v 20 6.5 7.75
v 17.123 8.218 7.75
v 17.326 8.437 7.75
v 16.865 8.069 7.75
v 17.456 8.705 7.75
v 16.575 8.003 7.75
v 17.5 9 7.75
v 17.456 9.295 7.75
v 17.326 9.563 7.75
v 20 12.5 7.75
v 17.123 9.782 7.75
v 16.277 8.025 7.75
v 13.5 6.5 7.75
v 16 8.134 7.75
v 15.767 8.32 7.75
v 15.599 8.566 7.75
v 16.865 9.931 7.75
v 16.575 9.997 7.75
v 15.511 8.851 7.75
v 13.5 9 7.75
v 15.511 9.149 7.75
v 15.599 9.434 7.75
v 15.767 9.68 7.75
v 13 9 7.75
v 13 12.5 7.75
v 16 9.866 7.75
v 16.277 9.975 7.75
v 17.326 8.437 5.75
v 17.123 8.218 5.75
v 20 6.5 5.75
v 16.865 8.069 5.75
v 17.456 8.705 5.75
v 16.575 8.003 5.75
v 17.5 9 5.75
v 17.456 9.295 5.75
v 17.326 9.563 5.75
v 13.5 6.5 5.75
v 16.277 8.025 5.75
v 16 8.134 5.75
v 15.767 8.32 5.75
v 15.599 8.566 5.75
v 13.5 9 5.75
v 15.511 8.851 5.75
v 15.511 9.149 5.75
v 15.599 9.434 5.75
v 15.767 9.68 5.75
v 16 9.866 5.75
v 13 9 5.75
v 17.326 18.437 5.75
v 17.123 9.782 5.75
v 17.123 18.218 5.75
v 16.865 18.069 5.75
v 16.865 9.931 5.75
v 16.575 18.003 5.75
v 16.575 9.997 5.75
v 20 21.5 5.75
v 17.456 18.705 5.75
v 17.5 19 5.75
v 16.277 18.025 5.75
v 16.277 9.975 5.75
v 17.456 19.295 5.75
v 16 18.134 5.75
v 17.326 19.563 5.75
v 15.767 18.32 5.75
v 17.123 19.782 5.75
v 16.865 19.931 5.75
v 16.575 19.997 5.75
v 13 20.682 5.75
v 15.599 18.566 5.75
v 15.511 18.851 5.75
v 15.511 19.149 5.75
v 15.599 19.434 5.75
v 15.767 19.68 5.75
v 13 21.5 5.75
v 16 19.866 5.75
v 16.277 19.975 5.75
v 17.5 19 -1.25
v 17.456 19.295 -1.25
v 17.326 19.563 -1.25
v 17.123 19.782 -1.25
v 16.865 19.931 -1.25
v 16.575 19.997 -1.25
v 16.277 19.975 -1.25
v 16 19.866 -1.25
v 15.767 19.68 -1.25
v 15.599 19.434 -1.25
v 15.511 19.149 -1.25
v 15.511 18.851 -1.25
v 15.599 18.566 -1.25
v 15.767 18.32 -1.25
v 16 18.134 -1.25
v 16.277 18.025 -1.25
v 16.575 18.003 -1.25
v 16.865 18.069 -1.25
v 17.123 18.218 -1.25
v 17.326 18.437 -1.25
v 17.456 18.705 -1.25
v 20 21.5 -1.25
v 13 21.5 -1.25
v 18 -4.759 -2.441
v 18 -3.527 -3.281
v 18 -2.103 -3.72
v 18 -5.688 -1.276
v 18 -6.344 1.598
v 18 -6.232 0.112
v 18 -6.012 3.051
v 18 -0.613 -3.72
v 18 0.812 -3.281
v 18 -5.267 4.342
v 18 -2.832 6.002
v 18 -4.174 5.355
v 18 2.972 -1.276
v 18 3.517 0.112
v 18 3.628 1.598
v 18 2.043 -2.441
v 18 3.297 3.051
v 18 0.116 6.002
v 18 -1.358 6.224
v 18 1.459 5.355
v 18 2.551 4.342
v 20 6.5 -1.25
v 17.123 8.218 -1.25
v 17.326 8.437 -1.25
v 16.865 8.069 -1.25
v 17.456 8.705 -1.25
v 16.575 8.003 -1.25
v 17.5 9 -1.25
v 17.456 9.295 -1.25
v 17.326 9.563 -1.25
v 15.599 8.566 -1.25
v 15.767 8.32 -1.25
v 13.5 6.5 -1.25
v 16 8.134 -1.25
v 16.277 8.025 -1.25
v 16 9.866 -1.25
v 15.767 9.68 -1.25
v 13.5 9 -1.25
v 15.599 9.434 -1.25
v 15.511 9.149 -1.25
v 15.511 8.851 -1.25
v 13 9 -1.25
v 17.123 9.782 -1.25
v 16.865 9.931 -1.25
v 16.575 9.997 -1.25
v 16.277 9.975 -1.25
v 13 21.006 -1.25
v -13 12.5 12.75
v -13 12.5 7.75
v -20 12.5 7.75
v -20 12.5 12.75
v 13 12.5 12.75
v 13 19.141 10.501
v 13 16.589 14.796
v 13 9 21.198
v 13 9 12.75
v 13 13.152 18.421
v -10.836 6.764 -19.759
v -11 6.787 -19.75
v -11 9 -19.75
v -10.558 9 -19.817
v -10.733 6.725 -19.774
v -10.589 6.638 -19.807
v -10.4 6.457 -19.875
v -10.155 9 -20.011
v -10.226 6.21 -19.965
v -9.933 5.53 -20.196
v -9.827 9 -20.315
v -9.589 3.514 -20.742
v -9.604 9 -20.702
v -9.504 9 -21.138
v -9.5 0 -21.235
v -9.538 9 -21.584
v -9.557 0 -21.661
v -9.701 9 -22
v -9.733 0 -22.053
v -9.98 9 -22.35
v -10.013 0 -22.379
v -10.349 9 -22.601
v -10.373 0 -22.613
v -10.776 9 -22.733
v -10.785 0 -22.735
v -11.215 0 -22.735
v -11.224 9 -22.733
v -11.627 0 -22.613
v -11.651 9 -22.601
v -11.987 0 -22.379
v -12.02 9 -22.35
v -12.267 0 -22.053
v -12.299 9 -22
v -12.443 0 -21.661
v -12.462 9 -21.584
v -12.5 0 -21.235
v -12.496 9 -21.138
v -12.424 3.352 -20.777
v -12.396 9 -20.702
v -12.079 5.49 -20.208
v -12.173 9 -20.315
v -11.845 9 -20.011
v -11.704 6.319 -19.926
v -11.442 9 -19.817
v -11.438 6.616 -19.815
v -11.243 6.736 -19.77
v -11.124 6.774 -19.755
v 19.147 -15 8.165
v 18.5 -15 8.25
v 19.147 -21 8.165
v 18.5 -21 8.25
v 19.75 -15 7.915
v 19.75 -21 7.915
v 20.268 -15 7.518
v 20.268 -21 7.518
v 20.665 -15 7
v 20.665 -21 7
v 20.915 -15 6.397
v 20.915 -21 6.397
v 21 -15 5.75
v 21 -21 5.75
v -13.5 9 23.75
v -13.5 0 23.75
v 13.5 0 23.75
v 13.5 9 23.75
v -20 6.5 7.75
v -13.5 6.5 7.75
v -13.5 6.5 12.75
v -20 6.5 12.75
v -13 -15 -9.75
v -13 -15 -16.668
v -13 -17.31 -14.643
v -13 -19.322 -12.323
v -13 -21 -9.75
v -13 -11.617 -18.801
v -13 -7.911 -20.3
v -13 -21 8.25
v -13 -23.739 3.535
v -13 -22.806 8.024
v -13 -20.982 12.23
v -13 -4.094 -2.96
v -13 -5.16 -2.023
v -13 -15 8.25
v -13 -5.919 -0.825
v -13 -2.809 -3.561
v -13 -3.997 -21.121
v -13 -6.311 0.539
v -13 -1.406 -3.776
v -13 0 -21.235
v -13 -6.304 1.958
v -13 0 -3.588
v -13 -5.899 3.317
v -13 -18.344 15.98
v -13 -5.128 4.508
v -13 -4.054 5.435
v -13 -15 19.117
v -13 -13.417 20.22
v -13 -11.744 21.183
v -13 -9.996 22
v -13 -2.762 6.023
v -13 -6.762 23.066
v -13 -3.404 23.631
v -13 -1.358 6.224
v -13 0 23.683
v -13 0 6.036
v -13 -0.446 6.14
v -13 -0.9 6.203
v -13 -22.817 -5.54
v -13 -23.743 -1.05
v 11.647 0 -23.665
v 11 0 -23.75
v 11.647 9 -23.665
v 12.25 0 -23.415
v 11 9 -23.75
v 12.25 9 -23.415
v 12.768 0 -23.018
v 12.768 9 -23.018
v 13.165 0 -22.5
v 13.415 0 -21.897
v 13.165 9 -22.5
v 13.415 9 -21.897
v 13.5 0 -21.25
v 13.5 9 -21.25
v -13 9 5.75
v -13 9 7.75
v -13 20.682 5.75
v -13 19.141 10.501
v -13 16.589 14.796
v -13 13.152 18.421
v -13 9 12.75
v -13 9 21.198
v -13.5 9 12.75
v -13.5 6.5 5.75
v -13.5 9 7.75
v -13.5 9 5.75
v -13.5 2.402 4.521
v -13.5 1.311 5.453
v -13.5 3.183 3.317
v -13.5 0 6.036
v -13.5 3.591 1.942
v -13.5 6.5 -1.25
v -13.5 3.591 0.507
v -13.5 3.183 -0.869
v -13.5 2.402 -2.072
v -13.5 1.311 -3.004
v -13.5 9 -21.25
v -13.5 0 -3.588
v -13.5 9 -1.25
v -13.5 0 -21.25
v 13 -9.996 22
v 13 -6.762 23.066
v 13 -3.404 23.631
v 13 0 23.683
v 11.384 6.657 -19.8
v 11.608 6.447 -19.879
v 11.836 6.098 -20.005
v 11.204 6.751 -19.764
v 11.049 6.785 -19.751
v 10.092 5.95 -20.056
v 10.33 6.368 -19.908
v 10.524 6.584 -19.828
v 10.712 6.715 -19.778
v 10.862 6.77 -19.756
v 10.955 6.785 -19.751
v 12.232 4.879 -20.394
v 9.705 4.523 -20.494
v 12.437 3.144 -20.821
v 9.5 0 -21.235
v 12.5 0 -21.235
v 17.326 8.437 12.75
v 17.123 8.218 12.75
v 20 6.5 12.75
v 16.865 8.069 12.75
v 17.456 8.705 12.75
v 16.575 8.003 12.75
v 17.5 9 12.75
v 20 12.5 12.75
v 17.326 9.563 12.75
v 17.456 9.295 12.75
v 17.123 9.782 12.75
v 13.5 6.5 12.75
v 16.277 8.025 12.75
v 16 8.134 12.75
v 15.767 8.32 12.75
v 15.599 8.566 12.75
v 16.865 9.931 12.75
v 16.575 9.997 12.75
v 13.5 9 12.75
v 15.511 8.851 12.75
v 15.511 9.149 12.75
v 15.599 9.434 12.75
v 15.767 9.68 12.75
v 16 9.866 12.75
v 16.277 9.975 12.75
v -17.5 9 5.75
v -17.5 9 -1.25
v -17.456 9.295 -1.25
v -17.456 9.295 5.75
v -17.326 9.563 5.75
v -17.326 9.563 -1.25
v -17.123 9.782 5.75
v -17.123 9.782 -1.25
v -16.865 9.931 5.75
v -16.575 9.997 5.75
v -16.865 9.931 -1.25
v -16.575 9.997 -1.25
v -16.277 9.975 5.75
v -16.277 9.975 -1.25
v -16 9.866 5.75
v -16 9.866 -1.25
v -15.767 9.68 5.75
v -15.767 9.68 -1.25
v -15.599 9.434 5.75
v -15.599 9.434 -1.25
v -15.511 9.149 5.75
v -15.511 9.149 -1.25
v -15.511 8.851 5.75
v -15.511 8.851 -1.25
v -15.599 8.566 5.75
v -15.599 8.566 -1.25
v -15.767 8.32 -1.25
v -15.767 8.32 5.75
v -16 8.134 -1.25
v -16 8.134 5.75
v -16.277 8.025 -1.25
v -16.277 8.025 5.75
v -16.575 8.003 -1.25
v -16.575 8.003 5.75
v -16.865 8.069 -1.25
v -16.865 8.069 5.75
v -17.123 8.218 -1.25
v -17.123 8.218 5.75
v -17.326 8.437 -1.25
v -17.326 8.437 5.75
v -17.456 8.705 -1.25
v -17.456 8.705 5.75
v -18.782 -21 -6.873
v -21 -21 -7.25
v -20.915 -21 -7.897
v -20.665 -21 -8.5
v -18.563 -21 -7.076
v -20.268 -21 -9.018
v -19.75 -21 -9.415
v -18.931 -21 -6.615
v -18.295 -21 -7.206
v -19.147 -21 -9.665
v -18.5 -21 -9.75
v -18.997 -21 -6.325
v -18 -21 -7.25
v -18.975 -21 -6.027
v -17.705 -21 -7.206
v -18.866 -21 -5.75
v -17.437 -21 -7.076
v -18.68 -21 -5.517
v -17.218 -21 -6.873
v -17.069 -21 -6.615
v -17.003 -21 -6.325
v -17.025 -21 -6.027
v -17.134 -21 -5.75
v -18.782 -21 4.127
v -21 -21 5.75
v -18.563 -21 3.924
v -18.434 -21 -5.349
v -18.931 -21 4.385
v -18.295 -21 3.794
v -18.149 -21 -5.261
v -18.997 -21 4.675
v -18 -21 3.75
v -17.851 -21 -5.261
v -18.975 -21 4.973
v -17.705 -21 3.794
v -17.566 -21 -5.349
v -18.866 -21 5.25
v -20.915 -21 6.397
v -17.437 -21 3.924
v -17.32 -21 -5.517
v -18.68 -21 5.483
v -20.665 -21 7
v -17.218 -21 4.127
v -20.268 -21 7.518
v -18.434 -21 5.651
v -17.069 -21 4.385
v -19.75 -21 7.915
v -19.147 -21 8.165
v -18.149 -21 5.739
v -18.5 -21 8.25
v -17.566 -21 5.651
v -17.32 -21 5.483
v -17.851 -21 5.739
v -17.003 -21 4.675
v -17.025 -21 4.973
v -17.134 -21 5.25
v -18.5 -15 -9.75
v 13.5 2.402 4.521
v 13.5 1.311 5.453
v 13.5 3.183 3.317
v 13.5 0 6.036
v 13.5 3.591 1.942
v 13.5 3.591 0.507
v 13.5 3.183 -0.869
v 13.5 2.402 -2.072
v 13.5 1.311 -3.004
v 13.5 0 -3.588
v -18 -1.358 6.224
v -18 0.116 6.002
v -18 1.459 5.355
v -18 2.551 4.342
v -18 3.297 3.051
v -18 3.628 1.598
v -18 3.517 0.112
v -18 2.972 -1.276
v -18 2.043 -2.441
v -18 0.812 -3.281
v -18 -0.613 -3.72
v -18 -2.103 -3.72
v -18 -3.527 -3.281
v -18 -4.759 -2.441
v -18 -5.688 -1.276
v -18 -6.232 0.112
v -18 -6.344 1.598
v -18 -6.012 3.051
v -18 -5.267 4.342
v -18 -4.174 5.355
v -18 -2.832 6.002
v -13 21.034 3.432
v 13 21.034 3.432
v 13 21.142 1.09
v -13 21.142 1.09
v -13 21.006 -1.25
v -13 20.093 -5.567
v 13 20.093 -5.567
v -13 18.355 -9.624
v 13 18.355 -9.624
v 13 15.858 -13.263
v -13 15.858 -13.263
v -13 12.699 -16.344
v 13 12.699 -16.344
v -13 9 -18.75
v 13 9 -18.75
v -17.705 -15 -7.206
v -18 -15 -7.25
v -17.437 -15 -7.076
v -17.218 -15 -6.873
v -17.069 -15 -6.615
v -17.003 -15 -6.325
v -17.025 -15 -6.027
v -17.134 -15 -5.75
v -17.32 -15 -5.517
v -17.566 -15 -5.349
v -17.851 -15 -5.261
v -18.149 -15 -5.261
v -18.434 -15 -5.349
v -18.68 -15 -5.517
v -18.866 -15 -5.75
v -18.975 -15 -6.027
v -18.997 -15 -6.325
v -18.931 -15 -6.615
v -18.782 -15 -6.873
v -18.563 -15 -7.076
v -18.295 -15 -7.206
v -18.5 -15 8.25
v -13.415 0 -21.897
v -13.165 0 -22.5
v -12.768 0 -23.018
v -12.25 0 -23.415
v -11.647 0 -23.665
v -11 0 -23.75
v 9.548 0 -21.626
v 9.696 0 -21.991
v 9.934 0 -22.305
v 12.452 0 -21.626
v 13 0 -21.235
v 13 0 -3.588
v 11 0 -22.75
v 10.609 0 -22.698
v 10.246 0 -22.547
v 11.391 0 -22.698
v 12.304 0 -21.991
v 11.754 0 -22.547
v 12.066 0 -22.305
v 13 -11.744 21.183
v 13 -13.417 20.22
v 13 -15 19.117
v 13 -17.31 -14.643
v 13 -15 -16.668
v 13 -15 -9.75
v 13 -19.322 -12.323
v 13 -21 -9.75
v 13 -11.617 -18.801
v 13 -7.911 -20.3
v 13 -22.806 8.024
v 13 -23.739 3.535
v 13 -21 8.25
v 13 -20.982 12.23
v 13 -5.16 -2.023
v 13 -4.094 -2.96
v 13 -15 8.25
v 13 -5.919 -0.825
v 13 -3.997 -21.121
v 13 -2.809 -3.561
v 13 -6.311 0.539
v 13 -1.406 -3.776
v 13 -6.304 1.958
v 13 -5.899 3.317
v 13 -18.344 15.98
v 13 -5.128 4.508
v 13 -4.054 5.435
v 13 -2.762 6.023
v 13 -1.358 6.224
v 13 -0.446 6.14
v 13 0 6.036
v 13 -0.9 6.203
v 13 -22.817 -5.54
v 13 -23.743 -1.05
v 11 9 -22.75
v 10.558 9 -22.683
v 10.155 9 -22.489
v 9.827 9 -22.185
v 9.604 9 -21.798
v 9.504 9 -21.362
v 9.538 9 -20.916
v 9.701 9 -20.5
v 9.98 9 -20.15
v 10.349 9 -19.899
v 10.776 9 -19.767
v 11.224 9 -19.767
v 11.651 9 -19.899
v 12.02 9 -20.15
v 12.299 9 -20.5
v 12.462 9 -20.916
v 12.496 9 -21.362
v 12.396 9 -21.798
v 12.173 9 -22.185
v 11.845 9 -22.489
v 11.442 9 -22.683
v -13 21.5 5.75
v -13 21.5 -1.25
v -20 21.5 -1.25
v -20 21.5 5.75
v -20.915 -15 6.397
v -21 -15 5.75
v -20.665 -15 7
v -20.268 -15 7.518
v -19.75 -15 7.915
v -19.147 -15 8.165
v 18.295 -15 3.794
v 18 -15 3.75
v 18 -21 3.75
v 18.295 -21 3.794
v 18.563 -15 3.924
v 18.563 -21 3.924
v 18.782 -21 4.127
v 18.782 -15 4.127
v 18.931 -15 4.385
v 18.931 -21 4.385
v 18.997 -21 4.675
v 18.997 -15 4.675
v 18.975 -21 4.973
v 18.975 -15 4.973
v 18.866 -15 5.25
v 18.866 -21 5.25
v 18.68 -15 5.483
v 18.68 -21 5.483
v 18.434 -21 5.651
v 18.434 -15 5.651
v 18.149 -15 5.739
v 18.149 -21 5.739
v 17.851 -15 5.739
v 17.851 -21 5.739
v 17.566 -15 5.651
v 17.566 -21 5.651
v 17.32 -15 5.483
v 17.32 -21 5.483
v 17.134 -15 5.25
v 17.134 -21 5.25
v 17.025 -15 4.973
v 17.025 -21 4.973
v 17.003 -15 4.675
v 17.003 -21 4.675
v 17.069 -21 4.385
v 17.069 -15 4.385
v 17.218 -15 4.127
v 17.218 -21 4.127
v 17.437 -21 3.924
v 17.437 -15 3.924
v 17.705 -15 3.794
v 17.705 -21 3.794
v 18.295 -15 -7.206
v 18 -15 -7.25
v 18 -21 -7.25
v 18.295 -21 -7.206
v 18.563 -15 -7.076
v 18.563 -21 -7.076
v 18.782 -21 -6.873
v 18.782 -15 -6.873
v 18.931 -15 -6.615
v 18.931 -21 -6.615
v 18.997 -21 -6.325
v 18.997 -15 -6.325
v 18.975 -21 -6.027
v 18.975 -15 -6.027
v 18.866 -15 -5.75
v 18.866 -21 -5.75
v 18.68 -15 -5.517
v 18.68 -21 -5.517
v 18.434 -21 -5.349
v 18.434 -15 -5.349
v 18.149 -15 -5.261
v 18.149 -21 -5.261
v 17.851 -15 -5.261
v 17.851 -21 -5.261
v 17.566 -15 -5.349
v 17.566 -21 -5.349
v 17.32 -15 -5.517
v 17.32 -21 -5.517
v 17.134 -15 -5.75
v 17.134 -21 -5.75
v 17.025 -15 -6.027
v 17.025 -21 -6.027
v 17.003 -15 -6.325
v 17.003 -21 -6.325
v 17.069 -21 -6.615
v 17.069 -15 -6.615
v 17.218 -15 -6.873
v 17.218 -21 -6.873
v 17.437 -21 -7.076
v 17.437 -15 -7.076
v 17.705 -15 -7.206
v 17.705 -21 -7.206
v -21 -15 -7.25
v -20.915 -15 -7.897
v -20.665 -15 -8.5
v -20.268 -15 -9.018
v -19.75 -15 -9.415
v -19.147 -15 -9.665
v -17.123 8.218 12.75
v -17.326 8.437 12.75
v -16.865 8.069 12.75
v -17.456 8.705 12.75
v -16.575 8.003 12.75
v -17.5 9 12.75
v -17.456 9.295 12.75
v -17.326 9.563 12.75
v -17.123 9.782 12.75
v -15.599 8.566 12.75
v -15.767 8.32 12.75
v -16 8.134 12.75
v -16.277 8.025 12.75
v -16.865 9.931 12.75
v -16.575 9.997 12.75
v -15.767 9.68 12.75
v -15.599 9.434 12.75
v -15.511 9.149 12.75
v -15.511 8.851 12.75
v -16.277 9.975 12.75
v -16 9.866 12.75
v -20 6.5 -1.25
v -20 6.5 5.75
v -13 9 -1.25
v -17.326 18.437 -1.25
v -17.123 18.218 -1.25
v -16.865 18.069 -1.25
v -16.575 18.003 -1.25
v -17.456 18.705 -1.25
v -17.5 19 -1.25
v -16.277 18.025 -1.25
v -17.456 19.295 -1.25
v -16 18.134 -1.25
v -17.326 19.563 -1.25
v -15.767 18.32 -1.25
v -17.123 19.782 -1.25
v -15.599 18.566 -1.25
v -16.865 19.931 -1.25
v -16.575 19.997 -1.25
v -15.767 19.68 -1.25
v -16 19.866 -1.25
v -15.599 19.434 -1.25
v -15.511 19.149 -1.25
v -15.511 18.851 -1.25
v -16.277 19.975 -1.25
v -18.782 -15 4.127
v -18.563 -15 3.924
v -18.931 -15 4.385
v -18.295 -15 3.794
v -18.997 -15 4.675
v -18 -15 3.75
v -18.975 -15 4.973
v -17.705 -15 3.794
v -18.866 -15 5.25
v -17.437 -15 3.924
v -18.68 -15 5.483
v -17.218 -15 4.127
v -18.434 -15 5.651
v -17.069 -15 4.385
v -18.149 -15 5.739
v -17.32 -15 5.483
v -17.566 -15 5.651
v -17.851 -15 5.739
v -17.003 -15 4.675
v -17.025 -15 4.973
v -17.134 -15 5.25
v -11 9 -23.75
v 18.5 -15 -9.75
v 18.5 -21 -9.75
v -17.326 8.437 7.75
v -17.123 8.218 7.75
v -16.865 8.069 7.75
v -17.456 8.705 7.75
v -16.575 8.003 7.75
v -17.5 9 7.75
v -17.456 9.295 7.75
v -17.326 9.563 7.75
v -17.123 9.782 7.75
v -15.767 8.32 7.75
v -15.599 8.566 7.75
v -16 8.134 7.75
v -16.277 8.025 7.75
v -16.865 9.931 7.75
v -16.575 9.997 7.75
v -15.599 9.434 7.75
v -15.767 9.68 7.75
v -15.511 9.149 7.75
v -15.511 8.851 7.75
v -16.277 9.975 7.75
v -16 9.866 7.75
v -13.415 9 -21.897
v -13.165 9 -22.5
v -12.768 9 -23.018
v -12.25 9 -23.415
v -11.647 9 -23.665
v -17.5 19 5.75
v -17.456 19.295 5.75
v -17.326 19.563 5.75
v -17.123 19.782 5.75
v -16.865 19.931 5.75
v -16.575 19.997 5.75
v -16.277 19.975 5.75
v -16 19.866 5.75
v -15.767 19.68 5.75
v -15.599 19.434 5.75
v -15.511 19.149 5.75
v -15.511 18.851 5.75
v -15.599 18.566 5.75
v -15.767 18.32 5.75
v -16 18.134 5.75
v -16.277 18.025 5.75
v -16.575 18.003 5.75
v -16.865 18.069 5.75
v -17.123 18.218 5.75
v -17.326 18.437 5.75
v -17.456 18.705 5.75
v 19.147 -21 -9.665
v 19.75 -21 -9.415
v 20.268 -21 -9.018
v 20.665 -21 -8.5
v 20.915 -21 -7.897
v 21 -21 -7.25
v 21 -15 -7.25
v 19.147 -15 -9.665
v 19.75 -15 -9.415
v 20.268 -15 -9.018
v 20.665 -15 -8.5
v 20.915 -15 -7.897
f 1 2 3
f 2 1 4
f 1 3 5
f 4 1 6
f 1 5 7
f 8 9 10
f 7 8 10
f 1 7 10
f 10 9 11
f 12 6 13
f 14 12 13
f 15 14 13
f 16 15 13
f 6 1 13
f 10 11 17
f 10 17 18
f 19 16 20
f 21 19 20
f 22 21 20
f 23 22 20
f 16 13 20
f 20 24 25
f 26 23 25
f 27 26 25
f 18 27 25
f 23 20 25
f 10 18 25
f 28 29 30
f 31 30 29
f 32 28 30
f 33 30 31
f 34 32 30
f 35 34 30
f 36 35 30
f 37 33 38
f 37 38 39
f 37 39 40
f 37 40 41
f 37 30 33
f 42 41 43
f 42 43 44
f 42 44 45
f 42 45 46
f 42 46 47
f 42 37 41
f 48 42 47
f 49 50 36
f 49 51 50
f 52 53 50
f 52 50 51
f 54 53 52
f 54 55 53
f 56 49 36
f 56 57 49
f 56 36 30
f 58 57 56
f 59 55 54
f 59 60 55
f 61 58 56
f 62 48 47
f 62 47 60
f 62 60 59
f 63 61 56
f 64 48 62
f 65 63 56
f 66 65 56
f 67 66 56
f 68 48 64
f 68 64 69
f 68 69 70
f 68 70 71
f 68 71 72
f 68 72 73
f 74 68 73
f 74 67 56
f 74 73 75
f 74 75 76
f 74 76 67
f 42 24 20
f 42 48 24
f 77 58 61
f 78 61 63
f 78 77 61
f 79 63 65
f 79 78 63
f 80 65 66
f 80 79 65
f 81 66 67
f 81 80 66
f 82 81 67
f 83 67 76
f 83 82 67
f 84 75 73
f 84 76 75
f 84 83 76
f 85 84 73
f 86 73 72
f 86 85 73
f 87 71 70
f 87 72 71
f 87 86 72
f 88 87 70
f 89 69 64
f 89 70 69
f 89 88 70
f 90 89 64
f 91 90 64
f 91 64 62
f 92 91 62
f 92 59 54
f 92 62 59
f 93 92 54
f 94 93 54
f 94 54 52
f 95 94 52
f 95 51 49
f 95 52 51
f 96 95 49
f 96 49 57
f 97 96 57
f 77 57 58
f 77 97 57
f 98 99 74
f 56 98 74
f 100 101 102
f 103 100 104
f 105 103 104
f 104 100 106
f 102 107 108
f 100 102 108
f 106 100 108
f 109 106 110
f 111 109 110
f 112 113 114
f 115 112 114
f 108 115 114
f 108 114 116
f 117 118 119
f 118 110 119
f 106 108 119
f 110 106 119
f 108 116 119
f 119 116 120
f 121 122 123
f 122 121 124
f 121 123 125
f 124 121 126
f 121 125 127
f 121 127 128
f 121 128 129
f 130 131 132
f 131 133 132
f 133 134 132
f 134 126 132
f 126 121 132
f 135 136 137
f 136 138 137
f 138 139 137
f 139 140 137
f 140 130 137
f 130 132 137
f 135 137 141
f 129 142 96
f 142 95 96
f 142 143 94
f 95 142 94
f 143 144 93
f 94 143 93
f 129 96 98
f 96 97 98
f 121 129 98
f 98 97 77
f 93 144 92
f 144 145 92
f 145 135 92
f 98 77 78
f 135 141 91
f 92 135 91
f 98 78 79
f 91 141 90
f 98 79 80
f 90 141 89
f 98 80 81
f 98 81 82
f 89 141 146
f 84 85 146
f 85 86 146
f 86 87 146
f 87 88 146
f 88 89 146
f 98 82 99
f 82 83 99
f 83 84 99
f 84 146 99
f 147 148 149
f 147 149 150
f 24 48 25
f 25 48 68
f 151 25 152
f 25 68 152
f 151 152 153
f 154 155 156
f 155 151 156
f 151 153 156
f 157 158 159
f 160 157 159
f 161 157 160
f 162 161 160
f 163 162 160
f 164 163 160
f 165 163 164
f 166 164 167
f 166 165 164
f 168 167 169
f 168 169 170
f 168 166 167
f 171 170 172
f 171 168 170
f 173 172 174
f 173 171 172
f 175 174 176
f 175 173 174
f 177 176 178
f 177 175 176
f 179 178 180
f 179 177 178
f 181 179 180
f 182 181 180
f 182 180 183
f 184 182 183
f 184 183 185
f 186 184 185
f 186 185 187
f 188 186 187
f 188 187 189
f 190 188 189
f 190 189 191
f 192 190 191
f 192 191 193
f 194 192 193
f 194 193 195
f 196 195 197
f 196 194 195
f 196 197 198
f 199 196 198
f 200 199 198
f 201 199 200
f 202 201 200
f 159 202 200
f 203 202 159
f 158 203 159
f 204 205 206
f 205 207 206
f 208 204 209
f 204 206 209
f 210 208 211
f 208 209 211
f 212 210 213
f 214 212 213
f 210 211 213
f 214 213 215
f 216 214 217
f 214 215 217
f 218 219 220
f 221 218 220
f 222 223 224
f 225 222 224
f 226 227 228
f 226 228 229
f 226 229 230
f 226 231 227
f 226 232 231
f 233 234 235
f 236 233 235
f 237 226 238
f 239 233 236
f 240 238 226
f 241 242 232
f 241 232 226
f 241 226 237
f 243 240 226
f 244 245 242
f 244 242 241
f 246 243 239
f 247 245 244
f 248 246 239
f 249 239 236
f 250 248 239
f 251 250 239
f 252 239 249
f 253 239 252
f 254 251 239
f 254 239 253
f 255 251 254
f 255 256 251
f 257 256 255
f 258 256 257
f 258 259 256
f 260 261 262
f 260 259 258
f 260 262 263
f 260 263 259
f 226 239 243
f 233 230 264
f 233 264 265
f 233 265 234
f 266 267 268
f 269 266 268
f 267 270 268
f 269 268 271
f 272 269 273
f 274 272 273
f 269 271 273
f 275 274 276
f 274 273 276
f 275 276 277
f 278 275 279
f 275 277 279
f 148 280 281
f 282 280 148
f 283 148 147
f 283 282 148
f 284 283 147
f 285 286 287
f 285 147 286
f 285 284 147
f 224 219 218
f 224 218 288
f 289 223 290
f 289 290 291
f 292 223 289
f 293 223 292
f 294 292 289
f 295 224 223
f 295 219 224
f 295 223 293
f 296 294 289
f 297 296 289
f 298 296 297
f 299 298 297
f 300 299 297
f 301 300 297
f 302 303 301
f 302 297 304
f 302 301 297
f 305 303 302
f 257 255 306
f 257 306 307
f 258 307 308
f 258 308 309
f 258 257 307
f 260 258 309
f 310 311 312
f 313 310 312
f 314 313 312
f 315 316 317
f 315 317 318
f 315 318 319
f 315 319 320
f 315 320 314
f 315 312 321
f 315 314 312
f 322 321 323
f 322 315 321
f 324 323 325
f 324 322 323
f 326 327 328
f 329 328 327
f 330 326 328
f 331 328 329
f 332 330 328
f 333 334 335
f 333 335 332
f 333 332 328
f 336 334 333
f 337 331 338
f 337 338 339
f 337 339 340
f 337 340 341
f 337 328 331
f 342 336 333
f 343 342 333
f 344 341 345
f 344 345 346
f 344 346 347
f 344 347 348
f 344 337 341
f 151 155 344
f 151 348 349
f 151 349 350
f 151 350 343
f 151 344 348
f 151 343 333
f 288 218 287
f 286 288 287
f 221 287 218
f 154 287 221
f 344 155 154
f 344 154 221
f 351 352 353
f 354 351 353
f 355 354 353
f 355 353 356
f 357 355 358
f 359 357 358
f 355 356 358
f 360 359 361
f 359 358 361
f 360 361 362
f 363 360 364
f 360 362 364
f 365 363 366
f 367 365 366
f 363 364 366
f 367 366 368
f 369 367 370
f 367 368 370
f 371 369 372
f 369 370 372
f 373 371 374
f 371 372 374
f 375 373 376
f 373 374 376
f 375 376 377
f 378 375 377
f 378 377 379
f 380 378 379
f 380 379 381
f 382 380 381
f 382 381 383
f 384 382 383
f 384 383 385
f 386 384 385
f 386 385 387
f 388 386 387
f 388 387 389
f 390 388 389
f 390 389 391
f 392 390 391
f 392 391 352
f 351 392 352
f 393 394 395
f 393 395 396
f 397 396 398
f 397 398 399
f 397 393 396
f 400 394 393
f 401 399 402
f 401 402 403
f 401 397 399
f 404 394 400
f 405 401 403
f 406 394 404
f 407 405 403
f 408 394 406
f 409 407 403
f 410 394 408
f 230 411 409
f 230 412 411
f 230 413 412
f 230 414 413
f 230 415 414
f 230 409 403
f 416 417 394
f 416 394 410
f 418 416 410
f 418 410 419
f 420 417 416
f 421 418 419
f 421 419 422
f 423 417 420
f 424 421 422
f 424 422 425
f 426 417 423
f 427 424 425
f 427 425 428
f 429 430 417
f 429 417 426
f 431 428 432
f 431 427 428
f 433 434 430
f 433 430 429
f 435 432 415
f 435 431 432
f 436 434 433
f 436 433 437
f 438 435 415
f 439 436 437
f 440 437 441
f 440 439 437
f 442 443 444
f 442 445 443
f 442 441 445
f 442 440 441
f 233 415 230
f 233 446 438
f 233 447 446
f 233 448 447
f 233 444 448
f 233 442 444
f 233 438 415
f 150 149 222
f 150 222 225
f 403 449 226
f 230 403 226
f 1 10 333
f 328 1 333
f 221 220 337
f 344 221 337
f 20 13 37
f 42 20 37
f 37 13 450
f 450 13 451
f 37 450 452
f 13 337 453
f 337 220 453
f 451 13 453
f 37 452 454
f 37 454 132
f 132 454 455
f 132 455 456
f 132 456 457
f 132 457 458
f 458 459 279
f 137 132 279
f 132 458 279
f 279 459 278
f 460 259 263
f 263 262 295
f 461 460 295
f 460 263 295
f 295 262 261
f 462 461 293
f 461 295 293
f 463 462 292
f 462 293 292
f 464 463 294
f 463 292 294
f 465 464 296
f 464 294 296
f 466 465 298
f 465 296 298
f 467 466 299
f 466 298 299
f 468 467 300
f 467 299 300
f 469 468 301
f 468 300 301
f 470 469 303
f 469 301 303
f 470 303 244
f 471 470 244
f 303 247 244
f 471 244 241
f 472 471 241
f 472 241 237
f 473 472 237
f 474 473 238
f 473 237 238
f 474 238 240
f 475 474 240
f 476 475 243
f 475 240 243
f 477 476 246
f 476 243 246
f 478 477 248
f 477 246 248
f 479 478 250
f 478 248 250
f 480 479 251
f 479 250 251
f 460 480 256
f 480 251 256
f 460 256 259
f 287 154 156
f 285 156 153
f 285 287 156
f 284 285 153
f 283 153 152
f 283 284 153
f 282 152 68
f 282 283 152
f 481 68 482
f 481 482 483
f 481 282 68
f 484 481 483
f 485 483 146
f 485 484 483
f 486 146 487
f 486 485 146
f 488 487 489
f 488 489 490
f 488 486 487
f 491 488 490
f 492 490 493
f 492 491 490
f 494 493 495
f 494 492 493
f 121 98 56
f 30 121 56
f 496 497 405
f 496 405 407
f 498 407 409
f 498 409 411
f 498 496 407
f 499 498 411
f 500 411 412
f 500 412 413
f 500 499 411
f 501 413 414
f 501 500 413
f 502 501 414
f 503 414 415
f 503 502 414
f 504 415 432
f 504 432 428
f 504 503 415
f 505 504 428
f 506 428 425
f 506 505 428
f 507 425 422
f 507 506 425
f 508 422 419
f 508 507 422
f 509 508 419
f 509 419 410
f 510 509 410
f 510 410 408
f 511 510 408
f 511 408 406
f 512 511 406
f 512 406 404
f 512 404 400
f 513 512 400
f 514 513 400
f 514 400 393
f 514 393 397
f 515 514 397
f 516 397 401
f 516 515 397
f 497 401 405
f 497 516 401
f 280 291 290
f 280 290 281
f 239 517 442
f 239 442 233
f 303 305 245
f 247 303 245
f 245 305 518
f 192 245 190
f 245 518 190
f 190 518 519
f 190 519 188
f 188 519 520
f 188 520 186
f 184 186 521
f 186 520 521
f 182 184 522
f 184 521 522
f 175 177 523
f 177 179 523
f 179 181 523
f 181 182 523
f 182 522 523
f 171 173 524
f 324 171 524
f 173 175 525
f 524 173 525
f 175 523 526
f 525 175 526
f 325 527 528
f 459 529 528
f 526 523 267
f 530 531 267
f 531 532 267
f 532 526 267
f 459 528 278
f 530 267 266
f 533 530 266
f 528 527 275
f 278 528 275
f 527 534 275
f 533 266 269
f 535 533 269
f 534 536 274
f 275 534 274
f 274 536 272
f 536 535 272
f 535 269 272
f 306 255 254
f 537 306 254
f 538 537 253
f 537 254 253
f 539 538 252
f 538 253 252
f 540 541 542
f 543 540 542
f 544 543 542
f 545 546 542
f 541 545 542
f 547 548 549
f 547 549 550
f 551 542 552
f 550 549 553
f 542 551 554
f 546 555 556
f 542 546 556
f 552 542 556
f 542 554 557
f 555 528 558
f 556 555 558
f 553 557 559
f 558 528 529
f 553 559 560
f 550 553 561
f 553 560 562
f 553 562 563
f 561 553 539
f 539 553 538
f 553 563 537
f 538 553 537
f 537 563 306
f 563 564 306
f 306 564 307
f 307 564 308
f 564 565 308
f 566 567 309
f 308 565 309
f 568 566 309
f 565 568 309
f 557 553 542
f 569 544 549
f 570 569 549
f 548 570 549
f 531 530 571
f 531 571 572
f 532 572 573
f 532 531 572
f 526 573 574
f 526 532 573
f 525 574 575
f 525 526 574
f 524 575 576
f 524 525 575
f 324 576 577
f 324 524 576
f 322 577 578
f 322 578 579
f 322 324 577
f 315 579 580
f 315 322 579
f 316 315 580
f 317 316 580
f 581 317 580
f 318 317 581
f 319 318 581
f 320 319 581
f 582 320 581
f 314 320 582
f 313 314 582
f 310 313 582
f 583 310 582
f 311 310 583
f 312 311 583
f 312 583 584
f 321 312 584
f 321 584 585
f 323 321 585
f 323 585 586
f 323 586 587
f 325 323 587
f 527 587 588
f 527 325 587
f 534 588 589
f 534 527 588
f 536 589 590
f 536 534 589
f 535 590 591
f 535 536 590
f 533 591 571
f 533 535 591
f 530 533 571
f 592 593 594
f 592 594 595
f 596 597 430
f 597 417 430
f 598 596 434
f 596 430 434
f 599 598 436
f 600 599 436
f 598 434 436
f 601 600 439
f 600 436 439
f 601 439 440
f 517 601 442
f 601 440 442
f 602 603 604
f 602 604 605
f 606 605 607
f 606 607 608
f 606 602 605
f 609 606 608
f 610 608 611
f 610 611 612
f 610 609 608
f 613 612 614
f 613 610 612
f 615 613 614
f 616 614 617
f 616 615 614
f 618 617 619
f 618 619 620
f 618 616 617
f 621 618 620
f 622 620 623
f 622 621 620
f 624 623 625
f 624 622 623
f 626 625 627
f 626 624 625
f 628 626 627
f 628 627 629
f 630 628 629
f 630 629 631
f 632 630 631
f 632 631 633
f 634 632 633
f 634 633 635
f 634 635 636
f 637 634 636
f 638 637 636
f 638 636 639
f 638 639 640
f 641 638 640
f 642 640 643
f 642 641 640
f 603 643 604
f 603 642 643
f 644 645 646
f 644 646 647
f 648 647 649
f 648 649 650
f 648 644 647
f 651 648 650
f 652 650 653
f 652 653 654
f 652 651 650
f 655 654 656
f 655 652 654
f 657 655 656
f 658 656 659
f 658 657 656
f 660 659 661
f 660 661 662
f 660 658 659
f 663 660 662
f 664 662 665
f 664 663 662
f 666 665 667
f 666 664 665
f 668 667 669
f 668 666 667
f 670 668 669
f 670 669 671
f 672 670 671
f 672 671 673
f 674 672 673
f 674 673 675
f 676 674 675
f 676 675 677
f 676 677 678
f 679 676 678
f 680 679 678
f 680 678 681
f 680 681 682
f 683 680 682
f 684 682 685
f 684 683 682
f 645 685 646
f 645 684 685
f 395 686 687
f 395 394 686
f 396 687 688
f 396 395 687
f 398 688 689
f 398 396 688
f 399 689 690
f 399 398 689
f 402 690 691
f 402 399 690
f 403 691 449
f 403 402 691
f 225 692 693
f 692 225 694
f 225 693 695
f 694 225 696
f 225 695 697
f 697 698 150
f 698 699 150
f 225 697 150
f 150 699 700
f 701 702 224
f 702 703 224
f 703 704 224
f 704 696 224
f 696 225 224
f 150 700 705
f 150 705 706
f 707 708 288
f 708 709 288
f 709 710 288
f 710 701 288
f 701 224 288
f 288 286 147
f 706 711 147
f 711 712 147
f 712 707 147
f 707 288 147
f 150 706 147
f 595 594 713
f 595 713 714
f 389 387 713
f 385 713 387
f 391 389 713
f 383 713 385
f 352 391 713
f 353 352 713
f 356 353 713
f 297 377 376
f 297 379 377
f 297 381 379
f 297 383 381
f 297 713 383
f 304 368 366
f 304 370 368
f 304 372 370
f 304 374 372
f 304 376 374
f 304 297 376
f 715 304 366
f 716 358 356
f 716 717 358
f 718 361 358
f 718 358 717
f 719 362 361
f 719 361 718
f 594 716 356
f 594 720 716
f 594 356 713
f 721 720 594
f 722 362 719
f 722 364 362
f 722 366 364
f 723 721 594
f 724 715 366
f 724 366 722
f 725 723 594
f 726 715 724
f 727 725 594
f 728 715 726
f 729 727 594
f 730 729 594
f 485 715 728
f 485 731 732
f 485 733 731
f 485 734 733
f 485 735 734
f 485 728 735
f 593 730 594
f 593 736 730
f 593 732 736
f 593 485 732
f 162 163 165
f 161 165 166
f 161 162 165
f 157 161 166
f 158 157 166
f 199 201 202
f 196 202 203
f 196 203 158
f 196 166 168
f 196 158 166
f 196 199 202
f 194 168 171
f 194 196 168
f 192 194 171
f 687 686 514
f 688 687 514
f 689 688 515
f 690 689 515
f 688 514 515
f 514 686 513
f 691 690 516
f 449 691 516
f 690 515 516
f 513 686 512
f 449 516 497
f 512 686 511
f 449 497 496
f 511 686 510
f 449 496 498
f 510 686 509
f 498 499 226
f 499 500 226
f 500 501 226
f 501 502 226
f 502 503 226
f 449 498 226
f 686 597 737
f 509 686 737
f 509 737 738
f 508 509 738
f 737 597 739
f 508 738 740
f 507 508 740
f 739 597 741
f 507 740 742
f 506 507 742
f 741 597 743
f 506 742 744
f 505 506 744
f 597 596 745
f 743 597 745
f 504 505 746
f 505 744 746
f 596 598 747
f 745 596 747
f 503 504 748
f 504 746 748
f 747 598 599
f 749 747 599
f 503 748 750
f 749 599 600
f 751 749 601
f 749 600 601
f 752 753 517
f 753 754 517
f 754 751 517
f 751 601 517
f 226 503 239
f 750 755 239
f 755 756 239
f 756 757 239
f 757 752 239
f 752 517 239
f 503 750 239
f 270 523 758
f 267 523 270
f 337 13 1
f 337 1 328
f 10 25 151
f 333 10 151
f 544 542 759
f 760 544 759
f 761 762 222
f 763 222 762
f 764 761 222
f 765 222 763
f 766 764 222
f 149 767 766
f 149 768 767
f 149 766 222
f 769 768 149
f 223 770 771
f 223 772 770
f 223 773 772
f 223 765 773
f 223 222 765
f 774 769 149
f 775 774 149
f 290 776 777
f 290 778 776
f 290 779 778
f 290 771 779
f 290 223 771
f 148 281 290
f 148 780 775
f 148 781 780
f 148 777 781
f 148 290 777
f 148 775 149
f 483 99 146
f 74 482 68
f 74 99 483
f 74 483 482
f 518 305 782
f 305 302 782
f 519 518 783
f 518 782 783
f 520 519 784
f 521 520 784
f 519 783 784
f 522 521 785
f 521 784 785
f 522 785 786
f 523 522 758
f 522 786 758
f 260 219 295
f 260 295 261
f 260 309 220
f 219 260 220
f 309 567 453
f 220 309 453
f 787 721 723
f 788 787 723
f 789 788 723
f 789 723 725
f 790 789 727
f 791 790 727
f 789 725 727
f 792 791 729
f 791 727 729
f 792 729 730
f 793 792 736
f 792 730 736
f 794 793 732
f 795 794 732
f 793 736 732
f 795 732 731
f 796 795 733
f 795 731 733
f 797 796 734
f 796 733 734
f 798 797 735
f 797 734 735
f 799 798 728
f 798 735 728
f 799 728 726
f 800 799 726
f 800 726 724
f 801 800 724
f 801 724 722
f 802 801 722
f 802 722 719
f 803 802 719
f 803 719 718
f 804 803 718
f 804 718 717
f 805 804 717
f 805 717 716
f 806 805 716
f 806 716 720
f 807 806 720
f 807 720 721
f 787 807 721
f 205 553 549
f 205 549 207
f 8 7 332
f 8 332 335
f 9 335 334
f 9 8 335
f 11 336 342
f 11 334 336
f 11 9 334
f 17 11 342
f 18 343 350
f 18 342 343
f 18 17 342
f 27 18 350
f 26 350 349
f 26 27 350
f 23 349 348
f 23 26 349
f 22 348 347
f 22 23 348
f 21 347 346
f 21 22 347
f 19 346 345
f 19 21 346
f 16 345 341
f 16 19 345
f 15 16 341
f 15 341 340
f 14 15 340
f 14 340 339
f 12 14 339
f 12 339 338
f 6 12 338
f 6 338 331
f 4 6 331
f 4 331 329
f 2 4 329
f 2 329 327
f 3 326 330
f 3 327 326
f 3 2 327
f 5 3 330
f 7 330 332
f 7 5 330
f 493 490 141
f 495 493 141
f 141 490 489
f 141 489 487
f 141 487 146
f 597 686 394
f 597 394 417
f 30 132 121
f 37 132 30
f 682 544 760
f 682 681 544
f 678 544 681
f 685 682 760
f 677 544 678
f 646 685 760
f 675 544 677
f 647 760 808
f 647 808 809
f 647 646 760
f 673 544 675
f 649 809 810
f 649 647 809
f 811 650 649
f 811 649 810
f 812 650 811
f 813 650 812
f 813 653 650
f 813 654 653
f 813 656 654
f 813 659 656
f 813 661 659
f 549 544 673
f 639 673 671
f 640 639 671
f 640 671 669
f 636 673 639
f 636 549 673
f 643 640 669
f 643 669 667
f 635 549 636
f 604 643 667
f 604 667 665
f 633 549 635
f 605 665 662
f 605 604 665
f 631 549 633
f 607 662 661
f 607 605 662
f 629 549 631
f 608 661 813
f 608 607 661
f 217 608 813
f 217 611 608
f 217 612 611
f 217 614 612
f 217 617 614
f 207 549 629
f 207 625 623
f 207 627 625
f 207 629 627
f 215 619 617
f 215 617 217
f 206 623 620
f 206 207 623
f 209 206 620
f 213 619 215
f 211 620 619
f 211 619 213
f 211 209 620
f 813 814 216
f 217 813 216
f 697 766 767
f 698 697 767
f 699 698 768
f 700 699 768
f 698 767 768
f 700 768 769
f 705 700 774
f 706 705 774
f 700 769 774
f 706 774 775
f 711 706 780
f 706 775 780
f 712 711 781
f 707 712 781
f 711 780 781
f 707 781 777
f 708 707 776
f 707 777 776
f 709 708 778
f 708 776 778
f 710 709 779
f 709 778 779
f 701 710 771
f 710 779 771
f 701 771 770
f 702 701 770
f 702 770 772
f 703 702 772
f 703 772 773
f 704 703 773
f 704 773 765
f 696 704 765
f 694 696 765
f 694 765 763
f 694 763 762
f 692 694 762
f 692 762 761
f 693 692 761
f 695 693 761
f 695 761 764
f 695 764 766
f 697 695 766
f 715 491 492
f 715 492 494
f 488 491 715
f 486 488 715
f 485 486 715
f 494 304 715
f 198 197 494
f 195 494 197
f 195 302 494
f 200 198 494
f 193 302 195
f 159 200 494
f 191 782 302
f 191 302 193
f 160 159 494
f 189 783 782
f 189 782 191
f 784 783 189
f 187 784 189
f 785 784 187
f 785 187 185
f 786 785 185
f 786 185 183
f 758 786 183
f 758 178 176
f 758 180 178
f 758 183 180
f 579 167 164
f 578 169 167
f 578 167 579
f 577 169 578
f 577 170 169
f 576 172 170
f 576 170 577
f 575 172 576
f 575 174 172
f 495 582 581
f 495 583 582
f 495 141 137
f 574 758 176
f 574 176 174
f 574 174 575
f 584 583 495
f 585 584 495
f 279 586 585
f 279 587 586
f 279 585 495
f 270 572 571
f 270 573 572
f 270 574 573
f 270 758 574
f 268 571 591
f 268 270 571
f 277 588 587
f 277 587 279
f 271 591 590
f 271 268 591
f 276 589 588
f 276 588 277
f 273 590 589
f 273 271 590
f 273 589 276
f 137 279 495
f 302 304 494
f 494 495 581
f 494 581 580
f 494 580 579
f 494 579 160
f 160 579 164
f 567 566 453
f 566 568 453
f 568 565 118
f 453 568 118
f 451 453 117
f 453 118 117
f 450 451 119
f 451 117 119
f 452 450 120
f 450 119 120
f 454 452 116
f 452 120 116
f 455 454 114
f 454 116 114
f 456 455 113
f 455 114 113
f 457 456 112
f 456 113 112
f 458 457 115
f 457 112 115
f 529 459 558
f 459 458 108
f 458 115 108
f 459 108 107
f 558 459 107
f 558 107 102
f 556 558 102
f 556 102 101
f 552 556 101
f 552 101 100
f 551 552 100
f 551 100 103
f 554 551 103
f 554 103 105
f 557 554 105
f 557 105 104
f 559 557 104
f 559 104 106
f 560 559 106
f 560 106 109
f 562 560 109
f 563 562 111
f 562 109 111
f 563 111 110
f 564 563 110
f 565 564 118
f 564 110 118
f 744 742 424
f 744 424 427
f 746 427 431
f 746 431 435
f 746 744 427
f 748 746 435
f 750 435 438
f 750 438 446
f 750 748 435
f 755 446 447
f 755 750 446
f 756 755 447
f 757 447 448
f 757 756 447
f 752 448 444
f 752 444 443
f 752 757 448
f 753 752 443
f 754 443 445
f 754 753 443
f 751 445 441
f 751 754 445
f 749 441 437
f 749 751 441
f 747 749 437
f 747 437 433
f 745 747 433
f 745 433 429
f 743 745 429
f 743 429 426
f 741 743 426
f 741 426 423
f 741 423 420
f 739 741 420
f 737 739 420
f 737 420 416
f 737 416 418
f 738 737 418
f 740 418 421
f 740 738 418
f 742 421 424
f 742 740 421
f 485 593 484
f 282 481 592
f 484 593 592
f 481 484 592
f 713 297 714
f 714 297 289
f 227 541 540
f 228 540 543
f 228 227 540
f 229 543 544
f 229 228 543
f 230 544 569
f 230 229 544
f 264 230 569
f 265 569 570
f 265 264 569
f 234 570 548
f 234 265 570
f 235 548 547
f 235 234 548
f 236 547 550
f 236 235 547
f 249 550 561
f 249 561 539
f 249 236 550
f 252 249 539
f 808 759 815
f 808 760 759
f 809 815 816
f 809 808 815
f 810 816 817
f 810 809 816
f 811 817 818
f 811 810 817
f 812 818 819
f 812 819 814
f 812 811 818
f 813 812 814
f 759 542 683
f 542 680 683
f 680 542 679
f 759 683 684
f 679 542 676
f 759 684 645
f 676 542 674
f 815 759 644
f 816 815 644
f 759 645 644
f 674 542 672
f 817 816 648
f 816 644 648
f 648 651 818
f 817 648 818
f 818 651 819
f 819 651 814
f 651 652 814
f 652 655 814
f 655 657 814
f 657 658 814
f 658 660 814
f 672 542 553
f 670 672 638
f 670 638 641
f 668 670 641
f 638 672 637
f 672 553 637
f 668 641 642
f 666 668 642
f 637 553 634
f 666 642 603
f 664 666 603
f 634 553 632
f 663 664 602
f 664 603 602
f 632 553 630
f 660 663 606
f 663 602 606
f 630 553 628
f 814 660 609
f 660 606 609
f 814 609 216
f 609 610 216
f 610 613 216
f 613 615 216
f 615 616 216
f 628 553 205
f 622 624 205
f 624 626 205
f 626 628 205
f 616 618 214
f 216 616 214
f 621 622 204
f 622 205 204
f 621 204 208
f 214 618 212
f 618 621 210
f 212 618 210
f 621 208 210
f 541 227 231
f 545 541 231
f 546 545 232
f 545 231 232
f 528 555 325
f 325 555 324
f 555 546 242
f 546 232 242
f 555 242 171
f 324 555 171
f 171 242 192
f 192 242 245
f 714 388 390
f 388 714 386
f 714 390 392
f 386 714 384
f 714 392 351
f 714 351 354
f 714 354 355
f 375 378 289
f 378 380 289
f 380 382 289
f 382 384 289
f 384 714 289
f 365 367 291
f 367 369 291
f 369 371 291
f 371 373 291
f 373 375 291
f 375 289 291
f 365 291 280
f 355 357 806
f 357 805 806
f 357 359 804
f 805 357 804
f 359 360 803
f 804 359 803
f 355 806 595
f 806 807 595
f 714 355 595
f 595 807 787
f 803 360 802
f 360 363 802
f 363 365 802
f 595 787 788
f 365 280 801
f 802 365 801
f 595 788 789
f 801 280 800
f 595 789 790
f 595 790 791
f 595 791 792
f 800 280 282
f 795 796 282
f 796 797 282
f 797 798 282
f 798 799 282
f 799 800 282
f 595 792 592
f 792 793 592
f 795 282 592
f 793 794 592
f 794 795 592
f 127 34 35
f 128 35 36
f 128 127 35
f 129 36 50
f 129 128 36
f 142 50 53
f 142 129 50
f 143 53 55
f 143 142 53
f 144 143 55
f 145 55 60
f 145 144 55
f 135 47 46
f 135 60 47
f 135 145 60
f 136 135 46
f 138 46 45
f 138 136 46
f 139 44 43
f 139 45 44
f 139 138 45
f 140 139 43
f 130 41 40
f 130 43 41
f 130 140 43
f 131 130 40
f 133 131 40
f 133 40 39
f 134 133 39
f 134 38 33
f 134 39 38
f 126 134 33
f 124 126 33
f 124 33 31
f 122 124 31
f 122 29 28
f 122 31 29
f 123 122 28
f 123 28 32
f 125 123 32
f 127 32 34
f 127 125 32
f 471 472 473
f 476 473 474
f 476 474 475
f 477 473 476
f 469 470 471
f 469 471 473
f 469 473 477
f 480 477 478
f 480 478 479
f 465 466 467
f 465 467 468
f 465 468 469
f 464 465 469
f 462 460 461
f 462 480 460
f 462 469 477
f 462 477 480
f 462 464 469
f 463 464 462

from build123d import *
from build123d.topology import SkipClean

# Parameters (mm, degrees)
SKETCH3_W                 = 27
SKETCH3_H                 = 47.5
SKETCH3_R                 = 1.5
BOSS_EXTRUDE1_DEPTH       = 9
FILLET1_R                 = 2.5
SKETCH4_W                 = 26
SKETCH4_H                 = 44
BOSS_EXTRUDE5_DEPTH       = 15
SKETCH5_W                 = 25
SKETCH5_H                 = 18
BOSS_EXTRUDE6_DEPTH       = 5
SKETCH5_3_W               = 42
SKETCH5_3_H               = 18
SKETCH5_3_R               = 1
BOSS_EXTRUDE7_DEPTH       = 6
FILLET4_R                 = 2.5
CUT_EXTRUDE1_DEPTH        = 47.487229429
SKETCH6_5_R               = 22.5
BOSS_EXTRUDE8_DEPTH       = 26
SKETCH9_W                 = 7
SKETCH9_H                 = 15
SKETCH9_W_2               = 5
SKETCH9_H_2               = 6
BOSS_EXTRUDE9_DEPTH       = 7
SKETCH10_R                = 1
CUT_EXTRUDE2_DEPTH        = 41.437511922
BOSS_EXTRUDE10_DEPTH      = 5
BOSS_EXTRUDE10_DEPTH_BACK = 31
SKETCH6_6_R               = 5


with BuildPart() as part:
    # Sketch3 → Boss-Extrude1 (new body)
    with BuildSketch(Plane(origin=(0, 0, 0), x_dir=(1, 0, 0), z_dir=(0, 1, 0))):
        Rectangle(SKETCH3_W, SKETCH3_H)
        with Locations(Location((-11, 21.25, 0), (0, 0, 270))):
            Circle(SKETCH3_R, mode=Mode.SUBTRACT)
        with Locations(Location((11, 21.25, 0), (0, 0, 90))):
            Circle(SKETCH3_R, mode=Mode.SUBTRACT)
    extrude(amount=BOSS_EXTRUDE1_DEPTH)

    # Fillet1
    fillet1_edges = [part.edges().sort_by_distance(p)[0] for p in [
        (-13.5, 4.5, -23.75),
        (13.5, 4.5, -23.75),
    ]]
    fillet(fillet1_edges, radius=FILLET1_R)

    # Sketch4 → Boss-Extrude5 (add)
    with BuildSketch(Plane.XZ):
        Rectangle(SKETCH4_W, SKETCH4_H)
    extrude(amount=BOSS_EXTRUDE5_DEPTH)

    # Sketch5 → Boss-Extrude6 (add)
    with BuildSketch(Plane.XZ.offset(15)):
        with Locations((0, -0.75)):
            Rectangle(SKETCH5_W, SKETCH5_H)
    extrude(amount=-BOSS_EXTRUDE6_DEPTH)

    # Sketch5<3> → Boss-Extrude7 (add)
    with BuildSketch(Plane.XZ.offset(15)):
        with Locations((0, -0.75)):
            Rectangle(SKETCH5_3_W, SKETCH5_3_H)
        with Locations(Location((-18, -6.25, 0), (0, 0, 270))):
            Circle(SKETCH5_3_R, mode=Mode.SUBTRACT)
        with Locations(Location((18, -6.25, 0), (0, 0, 270))):
            Circle(SKETCH5_3_R, mode=Mode.SUBTRACT)
        with Locations(Location((-18, 4.75, 0), (0, 0, 270))):
            Circle(SKETCH5_3_R, mode=Mode.SUBTRACT)
        with Locations(Location((18, 4.75, 0), (0, 0, 270))):
            Circle(SKETCH5_3_R, mode=Mode.SUBTRACT)
    extrude(amount=BOSS_EXTRUDE7_DEPTH)

    # Fillet4
    fillet4_edges = [part.edges().sort_by_distance(p)[0] for p in [
        (21, -18, 8.25),
        (-21, -18, 8.25),
        (-21, -18, -9.75),
        (21, -18, -9.75),
    ]]
    fillet(fillet4_edges, radius=FILLET4_R)

    # Sketch6 → Cut-Extrude1 (cut, through all)
    with BuildSketch(Plane.ZY.offset(13)):
        with BuildLine():
            ThreePointArc((-16.66827394, -15), (-20.300466386, -7.910658998), (-21.234838924, 0))
            Line((-21.234838924, 0), (-22, 0))
            Line((-22, 0), (-22, -15))
            Line((-22, -15), (-16.66827394, -15))
        make_face()
        with BuildLine():
            Line((22, -15), (22, -9.995713029))
            ThreePointArc((22, -9.995713029), (20.719530361, -12.590758918), (19.116588355, -15))
            Line((19.116588355, -15), (22, -15))
        make_face()
    extrude(amount=-CUT_EXTRUDE1_DEPTH, mode=Mode.SUBTRACT)

    # Sketch6<5> → Boss-Extrude8 (add)
    with BuildSketch(Plane.ZY.offset(13)):
        with Locations((1.224157208, -1.357752838)):
            Circle(SKETCH6_5_R)
    extrude(amount=-BOSS_EXTRUDE8_DEPTH)

    # Sketch9 → Boss-Extrude9 (add)
    with BuildSketch(Plane.ZY.offset(13)):
        with Locations((2.25, 14)):
            Rectangle(SKETCH9_W, SKETCH9_H)
        with Locations((10.25, 9.5)):
            Rectangle(SKETCH9_W_2, SKETCH9_H_2)
    boss_extrude9 = extrude(amount=BOSS_EXTRUDE9_DEPTH)

    # Sketch10 → Cut-Extrude2 (cut, through all)
    with BuildSketch(Plane(origin=(0, 0, -1.25), x_dir=(-1, 0, 0), z_dir=(0, 0, -1))):
        with Locations((16.5, 9)):
            Circle(SKETCH10_R)
        with Locations((16.5, 19)):
            Circle(SKETCH10_R)
    cut_extrude2 = extrude(amount=-CUT_EXTRUDE2_DEPTH, mode=Mode.SUBTRACT)

    # Mirror1: Boss-Extrude9, Cut-Extrude2 across plane
    add(boss_extrude9.mirror(Plane(origin=(0, 0, 0), x_dir=(0, 0, 1), z_dir=(1, 0, 0))))
    add(cut_extrude2.mirror(Plane(origin=(0, 0, 0), x_dir=(0, 0, 1), z_dir=(1, 0, 0))), mode=Mode.SUBTRACT)

    # Sketch6<6> → Boss-Extrude10 (add, two sides: drawn at the far end of the back side and taken through both)
    with SkipClean():  # the faces are left unmerged after this step: merging them gives an invalid solid
        with BuildSketch(Plane.ZY.offset(13).offset(-BOSS_EXTRUDE10_DEPTH_BACK)):
            with Locations((1.224157208, -1.357752838)):
                Circle(SKETCH6_6_R)
        extrude(amount=BOSS_EXTRUDE10_DEPTH + BOSS_EXTRUDE10_DEPTH_BACK)


solid = part.part
